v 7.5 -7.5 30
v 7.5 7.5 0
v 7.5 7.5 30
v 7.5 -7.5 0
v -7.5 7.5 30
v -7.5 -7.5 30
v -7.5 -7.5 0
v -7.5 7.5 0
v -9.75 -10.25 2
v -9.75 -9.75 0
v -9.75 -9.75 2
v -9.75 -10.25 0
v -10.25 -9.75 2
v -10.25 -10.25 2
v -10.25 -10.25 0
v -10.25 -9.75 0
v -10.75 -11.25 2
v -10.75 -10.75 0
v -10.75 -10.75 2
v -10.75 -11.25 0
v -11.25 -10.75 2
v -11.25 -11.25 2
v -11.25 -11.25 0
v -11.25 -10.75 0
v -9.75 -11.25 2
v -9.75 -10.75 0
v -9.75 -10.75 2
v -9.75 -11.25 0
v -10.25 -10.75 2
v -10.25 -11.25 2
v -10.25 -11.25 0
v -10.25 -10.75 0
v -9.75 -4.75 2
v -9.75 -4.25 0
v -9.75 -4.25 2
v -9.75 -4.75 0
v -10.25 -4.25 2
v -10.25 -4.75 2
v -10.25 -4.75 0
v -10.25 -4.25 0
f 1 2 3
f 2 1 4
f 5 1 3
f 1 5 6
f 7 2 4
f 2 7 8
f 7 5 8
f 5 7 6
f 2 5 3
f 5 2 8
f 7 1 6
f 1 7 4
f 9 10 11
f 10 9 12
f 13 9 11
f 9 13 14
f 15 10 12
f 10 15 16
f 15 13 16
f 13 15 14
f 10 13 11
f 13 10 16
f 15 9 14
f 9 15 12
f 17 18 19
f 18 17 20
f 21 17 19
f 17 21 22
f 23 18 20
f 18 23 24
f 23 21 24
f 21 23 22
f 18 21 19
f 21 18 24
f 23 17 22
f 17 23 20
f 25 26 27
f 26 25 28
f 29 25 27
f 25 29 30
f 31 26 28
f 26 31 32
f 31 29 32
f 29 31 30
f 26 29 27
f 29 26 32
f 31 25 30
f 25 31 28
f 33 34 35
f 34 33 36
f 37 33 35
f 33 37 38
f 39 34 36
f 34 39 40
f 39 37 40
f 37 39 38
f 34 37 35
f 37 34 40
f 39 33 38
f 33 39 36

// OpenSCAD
translate([0, 0, 15]) color([0,1,0]) cube([15, 15, 30], center=true);
translate([-10, -10, 1]) color([1,0,0]) cube([0.5, 0.5, 2], center=true);
translate([-11, -11, 1]) color([1,0,0]) cube([0.5, 0.5, 2], center=true);
translate([-10, -11, 1]) color([1,0,0]) cube([0.5, 0.5, 2], center=true);
translate([-10, -4.5, 1]) color([1,0,0]) cube([0.5, 0.5, 2], center=true);
